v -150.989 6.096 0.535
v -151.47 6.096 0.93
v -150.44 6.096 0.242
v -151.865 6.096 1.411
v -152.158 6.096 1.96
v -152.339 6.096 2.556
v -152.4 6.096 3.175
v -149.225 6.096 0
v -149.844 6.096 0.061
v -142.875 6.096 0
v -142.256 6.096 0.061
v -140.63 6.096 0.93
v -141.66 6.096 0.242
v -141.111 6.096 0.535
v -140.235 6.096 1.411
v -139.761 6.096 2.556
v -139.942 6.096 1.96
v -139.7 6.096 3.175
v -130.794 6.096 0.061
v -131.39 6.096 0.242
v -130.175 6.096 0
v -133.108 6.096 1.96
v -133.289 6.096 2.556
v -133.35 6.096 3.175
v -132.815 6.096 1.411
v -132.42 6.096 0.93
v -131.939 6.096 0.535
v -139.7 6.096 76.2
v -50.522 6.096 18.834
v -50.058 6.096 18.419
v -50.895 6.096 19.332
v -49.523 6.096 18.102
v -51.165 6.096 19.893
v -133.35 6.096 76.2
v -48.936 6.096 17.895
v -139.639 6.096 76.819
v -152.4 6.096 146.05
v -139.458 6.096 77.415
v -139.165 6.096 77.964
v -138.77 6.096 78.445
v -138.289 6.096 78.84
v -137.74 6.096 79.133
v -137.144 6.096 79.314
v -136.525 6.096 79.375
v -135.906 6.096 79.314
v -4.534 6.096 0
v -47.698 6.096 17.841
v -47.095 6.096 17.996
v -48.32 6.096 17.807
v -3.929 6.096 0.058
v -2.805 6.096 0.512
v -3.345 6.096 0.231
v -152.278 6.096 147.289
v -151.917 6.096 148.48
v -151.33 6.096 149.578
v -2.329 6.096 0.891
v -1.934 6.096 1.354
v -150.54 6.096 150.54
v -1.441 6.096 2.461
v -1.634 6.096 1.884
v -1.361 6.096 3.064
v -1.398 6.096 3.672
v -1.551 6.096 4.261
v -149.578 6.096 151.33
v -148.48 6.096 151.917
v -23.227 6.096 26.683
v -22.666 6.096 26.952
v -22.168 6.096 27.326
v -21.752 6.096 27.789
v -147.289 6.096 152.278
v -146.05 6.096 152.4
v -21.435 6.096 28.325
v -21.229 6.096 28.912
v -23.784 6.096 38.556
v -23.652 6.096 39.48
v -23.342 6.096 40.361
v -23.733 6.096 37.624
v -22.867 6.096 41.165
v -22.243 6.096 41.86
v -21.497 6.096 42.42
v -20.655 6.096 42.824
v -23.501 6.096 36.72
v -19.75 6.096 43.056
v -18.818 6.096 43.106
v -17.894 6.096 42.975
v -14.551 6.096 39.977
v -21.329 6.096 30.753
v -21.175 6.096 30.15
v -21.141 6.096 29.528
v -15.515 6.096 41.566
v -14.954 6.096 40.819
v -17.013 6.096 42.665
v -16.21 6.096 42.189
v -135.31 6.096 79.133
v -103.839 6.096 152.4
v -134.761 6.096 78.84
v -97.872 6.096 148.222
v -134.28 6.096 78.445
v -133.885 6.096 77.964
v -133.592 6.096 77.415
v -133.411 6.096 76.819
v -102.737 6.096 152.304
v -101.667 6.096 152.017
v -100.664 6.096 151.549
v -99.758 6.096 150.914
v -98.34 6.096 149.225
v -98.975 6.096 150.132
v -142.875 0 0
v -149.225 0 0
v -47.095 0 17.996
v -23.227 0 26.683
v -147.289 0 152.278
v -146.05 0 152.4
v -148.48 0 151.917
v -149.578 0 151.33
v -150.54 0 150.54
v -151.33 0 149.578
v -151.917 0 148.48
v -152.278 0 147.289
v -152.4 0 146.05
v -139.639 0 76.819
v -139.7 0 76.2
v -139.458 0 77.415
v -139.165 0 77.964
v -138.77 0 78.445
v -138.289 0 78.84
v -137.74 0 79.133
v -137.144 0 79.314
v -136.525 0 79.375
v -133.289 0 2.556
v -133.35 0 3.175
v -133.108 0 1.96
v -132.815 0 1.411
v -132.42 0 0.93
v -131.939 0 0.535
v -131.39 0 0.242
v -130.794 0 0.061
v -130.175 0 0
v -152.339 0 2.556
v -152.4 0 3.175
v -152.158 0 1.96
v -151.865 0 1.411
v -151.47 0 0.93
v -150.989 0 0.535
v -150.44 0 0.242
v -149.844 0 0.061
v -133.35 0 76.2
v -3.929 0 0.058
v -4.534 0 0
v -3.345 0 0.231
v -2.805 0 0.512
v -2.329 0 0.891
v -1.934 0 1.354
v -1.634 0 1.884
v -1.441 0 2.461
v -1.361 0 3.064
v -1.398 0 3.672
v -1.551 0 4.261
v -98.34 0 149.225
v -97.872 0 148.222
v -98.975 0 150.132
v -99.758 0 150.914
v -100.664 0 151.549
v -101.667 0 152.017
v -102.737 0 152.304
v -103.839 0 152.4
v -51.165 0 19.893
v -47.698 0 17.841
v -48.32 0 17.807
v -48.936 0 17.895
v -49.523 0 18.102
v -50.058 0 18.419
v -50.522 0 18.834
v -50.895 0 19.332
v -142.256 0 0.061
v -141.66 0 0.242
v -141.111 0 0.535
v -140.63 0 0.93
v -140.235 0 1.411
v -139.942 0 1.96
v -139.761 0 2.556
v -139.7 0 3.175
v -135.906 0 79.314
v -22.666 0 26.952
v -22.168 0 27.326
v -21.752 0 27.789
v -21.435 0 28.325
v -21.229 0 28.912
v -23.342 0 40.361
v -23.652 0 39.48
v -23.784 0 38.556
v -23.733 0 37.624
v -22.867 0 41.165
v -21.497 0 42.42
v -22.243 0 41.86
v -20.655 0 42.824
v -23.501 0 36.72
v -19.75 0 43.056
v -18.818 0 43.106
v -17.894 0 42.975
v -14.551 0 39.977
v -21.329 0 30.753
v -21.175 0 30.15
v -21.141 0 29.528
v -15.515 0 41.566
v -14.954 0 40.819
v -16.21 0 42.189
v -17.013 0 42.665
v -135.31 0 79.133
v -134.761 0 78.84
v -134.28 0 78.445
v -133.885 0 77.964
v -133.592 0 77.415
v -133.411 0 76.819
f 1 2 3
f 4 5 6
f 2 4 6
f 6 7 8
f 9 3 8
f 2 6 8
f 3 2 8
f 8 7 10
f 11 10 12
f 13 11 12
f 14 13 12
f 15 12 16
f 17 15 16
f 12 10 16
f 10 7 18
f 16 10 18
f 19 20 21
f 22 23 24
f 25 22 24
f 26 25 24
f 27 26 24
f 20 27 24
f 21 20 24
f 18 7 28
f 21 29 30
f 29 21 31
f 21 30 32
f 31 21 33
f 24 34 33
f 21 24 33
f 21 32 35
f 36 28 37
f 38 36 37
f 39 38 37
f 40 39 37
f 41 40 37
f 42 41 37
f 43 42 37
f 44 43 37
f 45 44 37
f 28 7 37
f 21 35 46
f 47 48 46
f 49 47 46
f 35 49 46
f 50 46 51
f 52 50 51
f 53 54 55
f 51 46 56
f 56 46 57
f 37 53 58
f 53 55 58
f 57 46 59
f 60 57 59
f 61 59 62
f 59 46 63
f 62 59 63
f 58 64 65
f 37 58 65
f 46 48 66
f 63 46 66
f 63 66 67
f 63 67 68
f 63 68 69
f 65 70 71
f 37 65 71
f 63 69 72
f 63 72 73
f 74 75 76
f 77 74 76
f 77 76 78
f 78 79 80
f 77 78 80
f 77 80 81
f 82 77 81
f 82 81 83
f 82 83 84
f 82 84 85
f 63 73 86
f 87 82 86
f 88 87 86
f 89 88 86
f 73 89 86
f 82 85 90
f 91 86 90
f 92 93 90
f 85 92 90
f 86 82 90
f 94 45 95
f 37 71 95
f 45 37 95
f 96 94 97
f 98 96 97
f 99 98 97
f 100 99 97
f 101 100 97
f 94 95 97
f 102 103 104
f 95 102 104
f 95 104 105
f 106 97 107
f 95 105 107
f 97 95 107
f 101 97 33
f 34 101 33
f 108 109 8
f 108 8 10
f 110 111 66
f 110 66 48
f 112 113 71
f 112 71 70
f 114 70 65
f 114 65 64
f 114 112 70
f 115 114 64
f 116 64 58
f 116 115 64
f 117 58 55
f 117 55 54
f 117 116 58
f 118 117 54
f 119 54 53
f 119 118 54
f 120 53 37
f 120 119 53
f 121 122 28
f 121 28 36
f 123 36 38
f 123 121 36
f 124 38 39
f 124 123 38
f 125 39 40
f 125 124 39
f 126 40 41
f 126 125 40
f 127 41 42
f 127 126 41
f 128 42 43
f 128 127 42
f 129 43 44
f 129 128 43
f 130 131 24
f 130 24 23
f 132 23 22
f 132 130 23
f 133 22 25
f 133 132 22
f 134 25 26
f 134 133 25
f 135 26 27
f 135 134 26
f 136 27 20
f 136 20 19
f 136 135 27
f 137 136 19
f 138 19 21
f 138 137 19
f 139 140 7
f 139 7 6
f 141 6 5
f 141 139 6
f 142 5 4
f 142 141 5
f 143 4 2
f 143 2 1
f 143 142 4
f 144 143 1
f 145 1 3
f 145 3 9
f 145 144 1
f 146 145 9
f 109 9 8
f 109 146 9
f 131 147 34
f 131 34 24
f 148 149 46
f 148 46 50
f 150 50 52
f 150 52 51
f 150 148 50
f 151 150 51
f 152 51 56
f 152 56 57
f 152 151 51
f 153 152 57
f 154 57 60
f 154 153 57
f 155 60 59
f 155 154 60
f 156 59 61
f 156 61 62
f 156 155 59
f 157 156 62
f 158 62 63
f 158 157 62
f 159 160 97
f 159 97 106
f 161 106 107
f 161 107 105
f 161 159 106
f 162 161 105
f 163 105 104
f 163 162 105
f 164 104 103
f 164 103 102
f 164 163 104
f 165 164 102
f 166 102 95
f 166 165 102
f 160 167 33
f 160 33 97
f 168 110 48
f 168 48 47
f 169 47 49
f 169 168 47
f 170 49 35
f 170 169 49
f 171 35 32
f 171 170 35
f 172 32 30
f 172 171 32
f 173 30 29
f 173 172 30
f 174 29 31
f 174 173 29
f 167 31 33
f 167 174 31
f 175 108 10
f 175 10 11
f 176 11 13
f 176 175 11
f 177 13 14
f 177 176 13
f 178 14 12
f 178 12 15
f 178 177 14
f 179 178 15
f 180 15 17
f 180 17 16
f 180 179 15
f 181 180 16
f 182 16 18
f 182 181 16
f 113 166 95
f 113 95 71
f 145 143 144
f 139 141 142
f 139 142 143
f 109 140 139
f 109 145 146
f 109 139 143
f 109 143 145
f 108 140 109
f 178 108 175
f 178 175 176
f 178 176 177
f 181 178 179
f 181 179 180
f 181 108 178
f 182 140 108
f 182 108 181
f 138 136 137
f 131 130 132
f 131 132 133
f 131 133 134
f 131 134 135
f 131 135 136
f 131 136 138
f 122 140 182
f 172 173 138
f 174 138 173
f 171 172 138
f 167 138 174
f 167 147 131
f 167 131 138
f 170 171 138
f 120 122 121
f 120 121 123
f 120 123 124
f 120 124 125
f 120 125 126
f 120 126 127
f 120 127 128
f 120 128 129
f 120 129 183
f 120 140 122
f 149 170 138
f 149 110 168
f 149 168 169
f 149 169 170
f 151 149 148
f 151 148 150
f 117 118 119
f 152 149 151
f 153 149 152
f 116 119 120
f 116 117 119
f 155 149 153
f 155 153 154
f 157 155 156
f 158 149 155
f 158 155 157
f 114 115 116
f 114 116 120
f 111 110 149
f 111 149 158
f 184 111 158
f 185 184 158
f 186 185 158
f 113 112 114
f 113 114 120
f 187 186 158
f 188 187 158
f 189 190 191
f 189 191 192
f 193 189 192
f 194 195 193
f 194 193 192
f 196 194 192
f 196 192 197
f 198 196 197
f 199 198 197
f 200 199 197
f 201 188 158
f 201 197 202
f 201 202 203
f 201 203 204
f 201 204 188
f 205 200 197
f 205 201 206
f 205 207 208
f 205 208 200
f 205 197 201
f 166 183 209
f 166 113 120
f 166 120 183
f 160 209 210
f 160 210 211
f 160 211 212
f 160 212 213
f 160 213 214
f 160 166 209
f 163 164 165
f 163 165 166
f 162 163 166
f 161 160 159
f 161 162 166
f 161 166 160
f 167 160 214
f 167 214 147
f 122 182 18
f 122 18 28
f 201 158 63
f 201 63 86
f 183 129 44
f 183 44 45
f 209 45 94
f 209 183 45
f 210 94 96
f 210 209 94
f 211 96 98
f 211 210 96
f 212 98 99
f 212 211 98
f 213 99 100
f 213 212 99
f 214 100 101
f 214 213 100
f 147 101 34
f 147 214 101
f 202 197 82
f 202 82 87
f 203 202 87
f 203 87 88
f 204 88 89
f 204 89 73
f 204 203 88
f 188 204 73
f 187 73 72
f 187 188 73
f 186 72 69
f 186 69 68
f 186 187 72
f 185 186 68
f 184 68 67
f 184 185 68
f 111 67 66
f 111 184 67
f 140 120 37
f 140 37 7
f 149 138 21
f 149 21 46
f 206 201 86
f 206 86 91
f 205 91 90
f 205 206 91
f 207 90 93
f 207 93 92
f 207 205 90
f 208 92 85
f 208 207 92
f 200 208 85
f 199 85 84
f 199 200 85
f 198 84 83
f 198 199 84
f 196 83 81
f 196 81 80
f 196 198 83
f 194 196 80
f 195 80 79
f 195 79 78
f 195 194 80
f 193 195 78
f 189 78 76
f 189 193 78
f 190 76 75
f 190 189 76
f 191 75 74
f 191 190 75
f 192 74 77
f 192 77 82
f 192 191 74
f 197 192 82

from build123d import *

# Parameters (mm, degrees)
F1_DEPTH = 6.096


with BuildPart() as f1:
    # F0 (on Front) → F1 (new body)
    with BuildSketch(Plane.XZ):
        with BuildLine():
            Line((-103.839319, 152.4), (-146.05, 152.4))
            ThreePointArc((-146.05, 152.4), (-150.540128, 150.540128), (-152.4, 146.05))
            Line((-152.4, 146.05), (-152.4, 3.175))
            ThreePointArc((-152.4, 3.175), (-151.470064, 0.929936), (-149.225, 0))
            Line((-149.225, 0), (-142.875, 0))
            ThreePointArc((-142.875, 0), (-140.629936, 0.929936), (-139.7, 3.175))
            Line((-139.7, 3.175), (-139.7, 76.2))
            ThreePointArc((-139.7, 76.2), (-138.770064, 78.445064), (-136.525, 79.375))
            ThreePointArc((-136.525, 79.375), (-134.279936, 78.445064), (-133.35, 76.2))
            Line((-133.35, 76.2), (-133.35, 3.175))
            ThreePointArc((-133.35, 3.175), (-132.420064, 0.929936), (-130.175, 0))
            Line((-130.175, 0), (-4.53437, 0))
            ThreePointArc((-4.53437, 0), (-1.933562, 1.353895), (-1.550846, 4.260914))
            Line((-1.550846, 4.260914), (-14.550568, 39.977357))
            ThreePointArc((-14.550568, 39.977357), (-20.654725, 42.823772), (-23.50114, 36.719615))
            Line((-23.50114, 36.719615), (-21.329312, 30.752567))
            ThreePointArc((-21.329312, 30.752567), (-21.435309, 28.32484), (-23.226922, 26.683129))
            Line((-23.226922, 26.683129), (-47.095115, 17.995817))
            ThreePointArc((-47.095115, 17.995817), (-49.522842, 18.101814), (-51.164553, 19.893427))
            Line((-51.164553, 19.893427), (-97.872271, 148.221828))
            ThreePointArc((-97.872271, 148.221828), (-100.197109, 151.251615), (-103.839319, 152.4))
        make_face()
    extrude(amount=-F1_DEPTH)


solid = f1.part
